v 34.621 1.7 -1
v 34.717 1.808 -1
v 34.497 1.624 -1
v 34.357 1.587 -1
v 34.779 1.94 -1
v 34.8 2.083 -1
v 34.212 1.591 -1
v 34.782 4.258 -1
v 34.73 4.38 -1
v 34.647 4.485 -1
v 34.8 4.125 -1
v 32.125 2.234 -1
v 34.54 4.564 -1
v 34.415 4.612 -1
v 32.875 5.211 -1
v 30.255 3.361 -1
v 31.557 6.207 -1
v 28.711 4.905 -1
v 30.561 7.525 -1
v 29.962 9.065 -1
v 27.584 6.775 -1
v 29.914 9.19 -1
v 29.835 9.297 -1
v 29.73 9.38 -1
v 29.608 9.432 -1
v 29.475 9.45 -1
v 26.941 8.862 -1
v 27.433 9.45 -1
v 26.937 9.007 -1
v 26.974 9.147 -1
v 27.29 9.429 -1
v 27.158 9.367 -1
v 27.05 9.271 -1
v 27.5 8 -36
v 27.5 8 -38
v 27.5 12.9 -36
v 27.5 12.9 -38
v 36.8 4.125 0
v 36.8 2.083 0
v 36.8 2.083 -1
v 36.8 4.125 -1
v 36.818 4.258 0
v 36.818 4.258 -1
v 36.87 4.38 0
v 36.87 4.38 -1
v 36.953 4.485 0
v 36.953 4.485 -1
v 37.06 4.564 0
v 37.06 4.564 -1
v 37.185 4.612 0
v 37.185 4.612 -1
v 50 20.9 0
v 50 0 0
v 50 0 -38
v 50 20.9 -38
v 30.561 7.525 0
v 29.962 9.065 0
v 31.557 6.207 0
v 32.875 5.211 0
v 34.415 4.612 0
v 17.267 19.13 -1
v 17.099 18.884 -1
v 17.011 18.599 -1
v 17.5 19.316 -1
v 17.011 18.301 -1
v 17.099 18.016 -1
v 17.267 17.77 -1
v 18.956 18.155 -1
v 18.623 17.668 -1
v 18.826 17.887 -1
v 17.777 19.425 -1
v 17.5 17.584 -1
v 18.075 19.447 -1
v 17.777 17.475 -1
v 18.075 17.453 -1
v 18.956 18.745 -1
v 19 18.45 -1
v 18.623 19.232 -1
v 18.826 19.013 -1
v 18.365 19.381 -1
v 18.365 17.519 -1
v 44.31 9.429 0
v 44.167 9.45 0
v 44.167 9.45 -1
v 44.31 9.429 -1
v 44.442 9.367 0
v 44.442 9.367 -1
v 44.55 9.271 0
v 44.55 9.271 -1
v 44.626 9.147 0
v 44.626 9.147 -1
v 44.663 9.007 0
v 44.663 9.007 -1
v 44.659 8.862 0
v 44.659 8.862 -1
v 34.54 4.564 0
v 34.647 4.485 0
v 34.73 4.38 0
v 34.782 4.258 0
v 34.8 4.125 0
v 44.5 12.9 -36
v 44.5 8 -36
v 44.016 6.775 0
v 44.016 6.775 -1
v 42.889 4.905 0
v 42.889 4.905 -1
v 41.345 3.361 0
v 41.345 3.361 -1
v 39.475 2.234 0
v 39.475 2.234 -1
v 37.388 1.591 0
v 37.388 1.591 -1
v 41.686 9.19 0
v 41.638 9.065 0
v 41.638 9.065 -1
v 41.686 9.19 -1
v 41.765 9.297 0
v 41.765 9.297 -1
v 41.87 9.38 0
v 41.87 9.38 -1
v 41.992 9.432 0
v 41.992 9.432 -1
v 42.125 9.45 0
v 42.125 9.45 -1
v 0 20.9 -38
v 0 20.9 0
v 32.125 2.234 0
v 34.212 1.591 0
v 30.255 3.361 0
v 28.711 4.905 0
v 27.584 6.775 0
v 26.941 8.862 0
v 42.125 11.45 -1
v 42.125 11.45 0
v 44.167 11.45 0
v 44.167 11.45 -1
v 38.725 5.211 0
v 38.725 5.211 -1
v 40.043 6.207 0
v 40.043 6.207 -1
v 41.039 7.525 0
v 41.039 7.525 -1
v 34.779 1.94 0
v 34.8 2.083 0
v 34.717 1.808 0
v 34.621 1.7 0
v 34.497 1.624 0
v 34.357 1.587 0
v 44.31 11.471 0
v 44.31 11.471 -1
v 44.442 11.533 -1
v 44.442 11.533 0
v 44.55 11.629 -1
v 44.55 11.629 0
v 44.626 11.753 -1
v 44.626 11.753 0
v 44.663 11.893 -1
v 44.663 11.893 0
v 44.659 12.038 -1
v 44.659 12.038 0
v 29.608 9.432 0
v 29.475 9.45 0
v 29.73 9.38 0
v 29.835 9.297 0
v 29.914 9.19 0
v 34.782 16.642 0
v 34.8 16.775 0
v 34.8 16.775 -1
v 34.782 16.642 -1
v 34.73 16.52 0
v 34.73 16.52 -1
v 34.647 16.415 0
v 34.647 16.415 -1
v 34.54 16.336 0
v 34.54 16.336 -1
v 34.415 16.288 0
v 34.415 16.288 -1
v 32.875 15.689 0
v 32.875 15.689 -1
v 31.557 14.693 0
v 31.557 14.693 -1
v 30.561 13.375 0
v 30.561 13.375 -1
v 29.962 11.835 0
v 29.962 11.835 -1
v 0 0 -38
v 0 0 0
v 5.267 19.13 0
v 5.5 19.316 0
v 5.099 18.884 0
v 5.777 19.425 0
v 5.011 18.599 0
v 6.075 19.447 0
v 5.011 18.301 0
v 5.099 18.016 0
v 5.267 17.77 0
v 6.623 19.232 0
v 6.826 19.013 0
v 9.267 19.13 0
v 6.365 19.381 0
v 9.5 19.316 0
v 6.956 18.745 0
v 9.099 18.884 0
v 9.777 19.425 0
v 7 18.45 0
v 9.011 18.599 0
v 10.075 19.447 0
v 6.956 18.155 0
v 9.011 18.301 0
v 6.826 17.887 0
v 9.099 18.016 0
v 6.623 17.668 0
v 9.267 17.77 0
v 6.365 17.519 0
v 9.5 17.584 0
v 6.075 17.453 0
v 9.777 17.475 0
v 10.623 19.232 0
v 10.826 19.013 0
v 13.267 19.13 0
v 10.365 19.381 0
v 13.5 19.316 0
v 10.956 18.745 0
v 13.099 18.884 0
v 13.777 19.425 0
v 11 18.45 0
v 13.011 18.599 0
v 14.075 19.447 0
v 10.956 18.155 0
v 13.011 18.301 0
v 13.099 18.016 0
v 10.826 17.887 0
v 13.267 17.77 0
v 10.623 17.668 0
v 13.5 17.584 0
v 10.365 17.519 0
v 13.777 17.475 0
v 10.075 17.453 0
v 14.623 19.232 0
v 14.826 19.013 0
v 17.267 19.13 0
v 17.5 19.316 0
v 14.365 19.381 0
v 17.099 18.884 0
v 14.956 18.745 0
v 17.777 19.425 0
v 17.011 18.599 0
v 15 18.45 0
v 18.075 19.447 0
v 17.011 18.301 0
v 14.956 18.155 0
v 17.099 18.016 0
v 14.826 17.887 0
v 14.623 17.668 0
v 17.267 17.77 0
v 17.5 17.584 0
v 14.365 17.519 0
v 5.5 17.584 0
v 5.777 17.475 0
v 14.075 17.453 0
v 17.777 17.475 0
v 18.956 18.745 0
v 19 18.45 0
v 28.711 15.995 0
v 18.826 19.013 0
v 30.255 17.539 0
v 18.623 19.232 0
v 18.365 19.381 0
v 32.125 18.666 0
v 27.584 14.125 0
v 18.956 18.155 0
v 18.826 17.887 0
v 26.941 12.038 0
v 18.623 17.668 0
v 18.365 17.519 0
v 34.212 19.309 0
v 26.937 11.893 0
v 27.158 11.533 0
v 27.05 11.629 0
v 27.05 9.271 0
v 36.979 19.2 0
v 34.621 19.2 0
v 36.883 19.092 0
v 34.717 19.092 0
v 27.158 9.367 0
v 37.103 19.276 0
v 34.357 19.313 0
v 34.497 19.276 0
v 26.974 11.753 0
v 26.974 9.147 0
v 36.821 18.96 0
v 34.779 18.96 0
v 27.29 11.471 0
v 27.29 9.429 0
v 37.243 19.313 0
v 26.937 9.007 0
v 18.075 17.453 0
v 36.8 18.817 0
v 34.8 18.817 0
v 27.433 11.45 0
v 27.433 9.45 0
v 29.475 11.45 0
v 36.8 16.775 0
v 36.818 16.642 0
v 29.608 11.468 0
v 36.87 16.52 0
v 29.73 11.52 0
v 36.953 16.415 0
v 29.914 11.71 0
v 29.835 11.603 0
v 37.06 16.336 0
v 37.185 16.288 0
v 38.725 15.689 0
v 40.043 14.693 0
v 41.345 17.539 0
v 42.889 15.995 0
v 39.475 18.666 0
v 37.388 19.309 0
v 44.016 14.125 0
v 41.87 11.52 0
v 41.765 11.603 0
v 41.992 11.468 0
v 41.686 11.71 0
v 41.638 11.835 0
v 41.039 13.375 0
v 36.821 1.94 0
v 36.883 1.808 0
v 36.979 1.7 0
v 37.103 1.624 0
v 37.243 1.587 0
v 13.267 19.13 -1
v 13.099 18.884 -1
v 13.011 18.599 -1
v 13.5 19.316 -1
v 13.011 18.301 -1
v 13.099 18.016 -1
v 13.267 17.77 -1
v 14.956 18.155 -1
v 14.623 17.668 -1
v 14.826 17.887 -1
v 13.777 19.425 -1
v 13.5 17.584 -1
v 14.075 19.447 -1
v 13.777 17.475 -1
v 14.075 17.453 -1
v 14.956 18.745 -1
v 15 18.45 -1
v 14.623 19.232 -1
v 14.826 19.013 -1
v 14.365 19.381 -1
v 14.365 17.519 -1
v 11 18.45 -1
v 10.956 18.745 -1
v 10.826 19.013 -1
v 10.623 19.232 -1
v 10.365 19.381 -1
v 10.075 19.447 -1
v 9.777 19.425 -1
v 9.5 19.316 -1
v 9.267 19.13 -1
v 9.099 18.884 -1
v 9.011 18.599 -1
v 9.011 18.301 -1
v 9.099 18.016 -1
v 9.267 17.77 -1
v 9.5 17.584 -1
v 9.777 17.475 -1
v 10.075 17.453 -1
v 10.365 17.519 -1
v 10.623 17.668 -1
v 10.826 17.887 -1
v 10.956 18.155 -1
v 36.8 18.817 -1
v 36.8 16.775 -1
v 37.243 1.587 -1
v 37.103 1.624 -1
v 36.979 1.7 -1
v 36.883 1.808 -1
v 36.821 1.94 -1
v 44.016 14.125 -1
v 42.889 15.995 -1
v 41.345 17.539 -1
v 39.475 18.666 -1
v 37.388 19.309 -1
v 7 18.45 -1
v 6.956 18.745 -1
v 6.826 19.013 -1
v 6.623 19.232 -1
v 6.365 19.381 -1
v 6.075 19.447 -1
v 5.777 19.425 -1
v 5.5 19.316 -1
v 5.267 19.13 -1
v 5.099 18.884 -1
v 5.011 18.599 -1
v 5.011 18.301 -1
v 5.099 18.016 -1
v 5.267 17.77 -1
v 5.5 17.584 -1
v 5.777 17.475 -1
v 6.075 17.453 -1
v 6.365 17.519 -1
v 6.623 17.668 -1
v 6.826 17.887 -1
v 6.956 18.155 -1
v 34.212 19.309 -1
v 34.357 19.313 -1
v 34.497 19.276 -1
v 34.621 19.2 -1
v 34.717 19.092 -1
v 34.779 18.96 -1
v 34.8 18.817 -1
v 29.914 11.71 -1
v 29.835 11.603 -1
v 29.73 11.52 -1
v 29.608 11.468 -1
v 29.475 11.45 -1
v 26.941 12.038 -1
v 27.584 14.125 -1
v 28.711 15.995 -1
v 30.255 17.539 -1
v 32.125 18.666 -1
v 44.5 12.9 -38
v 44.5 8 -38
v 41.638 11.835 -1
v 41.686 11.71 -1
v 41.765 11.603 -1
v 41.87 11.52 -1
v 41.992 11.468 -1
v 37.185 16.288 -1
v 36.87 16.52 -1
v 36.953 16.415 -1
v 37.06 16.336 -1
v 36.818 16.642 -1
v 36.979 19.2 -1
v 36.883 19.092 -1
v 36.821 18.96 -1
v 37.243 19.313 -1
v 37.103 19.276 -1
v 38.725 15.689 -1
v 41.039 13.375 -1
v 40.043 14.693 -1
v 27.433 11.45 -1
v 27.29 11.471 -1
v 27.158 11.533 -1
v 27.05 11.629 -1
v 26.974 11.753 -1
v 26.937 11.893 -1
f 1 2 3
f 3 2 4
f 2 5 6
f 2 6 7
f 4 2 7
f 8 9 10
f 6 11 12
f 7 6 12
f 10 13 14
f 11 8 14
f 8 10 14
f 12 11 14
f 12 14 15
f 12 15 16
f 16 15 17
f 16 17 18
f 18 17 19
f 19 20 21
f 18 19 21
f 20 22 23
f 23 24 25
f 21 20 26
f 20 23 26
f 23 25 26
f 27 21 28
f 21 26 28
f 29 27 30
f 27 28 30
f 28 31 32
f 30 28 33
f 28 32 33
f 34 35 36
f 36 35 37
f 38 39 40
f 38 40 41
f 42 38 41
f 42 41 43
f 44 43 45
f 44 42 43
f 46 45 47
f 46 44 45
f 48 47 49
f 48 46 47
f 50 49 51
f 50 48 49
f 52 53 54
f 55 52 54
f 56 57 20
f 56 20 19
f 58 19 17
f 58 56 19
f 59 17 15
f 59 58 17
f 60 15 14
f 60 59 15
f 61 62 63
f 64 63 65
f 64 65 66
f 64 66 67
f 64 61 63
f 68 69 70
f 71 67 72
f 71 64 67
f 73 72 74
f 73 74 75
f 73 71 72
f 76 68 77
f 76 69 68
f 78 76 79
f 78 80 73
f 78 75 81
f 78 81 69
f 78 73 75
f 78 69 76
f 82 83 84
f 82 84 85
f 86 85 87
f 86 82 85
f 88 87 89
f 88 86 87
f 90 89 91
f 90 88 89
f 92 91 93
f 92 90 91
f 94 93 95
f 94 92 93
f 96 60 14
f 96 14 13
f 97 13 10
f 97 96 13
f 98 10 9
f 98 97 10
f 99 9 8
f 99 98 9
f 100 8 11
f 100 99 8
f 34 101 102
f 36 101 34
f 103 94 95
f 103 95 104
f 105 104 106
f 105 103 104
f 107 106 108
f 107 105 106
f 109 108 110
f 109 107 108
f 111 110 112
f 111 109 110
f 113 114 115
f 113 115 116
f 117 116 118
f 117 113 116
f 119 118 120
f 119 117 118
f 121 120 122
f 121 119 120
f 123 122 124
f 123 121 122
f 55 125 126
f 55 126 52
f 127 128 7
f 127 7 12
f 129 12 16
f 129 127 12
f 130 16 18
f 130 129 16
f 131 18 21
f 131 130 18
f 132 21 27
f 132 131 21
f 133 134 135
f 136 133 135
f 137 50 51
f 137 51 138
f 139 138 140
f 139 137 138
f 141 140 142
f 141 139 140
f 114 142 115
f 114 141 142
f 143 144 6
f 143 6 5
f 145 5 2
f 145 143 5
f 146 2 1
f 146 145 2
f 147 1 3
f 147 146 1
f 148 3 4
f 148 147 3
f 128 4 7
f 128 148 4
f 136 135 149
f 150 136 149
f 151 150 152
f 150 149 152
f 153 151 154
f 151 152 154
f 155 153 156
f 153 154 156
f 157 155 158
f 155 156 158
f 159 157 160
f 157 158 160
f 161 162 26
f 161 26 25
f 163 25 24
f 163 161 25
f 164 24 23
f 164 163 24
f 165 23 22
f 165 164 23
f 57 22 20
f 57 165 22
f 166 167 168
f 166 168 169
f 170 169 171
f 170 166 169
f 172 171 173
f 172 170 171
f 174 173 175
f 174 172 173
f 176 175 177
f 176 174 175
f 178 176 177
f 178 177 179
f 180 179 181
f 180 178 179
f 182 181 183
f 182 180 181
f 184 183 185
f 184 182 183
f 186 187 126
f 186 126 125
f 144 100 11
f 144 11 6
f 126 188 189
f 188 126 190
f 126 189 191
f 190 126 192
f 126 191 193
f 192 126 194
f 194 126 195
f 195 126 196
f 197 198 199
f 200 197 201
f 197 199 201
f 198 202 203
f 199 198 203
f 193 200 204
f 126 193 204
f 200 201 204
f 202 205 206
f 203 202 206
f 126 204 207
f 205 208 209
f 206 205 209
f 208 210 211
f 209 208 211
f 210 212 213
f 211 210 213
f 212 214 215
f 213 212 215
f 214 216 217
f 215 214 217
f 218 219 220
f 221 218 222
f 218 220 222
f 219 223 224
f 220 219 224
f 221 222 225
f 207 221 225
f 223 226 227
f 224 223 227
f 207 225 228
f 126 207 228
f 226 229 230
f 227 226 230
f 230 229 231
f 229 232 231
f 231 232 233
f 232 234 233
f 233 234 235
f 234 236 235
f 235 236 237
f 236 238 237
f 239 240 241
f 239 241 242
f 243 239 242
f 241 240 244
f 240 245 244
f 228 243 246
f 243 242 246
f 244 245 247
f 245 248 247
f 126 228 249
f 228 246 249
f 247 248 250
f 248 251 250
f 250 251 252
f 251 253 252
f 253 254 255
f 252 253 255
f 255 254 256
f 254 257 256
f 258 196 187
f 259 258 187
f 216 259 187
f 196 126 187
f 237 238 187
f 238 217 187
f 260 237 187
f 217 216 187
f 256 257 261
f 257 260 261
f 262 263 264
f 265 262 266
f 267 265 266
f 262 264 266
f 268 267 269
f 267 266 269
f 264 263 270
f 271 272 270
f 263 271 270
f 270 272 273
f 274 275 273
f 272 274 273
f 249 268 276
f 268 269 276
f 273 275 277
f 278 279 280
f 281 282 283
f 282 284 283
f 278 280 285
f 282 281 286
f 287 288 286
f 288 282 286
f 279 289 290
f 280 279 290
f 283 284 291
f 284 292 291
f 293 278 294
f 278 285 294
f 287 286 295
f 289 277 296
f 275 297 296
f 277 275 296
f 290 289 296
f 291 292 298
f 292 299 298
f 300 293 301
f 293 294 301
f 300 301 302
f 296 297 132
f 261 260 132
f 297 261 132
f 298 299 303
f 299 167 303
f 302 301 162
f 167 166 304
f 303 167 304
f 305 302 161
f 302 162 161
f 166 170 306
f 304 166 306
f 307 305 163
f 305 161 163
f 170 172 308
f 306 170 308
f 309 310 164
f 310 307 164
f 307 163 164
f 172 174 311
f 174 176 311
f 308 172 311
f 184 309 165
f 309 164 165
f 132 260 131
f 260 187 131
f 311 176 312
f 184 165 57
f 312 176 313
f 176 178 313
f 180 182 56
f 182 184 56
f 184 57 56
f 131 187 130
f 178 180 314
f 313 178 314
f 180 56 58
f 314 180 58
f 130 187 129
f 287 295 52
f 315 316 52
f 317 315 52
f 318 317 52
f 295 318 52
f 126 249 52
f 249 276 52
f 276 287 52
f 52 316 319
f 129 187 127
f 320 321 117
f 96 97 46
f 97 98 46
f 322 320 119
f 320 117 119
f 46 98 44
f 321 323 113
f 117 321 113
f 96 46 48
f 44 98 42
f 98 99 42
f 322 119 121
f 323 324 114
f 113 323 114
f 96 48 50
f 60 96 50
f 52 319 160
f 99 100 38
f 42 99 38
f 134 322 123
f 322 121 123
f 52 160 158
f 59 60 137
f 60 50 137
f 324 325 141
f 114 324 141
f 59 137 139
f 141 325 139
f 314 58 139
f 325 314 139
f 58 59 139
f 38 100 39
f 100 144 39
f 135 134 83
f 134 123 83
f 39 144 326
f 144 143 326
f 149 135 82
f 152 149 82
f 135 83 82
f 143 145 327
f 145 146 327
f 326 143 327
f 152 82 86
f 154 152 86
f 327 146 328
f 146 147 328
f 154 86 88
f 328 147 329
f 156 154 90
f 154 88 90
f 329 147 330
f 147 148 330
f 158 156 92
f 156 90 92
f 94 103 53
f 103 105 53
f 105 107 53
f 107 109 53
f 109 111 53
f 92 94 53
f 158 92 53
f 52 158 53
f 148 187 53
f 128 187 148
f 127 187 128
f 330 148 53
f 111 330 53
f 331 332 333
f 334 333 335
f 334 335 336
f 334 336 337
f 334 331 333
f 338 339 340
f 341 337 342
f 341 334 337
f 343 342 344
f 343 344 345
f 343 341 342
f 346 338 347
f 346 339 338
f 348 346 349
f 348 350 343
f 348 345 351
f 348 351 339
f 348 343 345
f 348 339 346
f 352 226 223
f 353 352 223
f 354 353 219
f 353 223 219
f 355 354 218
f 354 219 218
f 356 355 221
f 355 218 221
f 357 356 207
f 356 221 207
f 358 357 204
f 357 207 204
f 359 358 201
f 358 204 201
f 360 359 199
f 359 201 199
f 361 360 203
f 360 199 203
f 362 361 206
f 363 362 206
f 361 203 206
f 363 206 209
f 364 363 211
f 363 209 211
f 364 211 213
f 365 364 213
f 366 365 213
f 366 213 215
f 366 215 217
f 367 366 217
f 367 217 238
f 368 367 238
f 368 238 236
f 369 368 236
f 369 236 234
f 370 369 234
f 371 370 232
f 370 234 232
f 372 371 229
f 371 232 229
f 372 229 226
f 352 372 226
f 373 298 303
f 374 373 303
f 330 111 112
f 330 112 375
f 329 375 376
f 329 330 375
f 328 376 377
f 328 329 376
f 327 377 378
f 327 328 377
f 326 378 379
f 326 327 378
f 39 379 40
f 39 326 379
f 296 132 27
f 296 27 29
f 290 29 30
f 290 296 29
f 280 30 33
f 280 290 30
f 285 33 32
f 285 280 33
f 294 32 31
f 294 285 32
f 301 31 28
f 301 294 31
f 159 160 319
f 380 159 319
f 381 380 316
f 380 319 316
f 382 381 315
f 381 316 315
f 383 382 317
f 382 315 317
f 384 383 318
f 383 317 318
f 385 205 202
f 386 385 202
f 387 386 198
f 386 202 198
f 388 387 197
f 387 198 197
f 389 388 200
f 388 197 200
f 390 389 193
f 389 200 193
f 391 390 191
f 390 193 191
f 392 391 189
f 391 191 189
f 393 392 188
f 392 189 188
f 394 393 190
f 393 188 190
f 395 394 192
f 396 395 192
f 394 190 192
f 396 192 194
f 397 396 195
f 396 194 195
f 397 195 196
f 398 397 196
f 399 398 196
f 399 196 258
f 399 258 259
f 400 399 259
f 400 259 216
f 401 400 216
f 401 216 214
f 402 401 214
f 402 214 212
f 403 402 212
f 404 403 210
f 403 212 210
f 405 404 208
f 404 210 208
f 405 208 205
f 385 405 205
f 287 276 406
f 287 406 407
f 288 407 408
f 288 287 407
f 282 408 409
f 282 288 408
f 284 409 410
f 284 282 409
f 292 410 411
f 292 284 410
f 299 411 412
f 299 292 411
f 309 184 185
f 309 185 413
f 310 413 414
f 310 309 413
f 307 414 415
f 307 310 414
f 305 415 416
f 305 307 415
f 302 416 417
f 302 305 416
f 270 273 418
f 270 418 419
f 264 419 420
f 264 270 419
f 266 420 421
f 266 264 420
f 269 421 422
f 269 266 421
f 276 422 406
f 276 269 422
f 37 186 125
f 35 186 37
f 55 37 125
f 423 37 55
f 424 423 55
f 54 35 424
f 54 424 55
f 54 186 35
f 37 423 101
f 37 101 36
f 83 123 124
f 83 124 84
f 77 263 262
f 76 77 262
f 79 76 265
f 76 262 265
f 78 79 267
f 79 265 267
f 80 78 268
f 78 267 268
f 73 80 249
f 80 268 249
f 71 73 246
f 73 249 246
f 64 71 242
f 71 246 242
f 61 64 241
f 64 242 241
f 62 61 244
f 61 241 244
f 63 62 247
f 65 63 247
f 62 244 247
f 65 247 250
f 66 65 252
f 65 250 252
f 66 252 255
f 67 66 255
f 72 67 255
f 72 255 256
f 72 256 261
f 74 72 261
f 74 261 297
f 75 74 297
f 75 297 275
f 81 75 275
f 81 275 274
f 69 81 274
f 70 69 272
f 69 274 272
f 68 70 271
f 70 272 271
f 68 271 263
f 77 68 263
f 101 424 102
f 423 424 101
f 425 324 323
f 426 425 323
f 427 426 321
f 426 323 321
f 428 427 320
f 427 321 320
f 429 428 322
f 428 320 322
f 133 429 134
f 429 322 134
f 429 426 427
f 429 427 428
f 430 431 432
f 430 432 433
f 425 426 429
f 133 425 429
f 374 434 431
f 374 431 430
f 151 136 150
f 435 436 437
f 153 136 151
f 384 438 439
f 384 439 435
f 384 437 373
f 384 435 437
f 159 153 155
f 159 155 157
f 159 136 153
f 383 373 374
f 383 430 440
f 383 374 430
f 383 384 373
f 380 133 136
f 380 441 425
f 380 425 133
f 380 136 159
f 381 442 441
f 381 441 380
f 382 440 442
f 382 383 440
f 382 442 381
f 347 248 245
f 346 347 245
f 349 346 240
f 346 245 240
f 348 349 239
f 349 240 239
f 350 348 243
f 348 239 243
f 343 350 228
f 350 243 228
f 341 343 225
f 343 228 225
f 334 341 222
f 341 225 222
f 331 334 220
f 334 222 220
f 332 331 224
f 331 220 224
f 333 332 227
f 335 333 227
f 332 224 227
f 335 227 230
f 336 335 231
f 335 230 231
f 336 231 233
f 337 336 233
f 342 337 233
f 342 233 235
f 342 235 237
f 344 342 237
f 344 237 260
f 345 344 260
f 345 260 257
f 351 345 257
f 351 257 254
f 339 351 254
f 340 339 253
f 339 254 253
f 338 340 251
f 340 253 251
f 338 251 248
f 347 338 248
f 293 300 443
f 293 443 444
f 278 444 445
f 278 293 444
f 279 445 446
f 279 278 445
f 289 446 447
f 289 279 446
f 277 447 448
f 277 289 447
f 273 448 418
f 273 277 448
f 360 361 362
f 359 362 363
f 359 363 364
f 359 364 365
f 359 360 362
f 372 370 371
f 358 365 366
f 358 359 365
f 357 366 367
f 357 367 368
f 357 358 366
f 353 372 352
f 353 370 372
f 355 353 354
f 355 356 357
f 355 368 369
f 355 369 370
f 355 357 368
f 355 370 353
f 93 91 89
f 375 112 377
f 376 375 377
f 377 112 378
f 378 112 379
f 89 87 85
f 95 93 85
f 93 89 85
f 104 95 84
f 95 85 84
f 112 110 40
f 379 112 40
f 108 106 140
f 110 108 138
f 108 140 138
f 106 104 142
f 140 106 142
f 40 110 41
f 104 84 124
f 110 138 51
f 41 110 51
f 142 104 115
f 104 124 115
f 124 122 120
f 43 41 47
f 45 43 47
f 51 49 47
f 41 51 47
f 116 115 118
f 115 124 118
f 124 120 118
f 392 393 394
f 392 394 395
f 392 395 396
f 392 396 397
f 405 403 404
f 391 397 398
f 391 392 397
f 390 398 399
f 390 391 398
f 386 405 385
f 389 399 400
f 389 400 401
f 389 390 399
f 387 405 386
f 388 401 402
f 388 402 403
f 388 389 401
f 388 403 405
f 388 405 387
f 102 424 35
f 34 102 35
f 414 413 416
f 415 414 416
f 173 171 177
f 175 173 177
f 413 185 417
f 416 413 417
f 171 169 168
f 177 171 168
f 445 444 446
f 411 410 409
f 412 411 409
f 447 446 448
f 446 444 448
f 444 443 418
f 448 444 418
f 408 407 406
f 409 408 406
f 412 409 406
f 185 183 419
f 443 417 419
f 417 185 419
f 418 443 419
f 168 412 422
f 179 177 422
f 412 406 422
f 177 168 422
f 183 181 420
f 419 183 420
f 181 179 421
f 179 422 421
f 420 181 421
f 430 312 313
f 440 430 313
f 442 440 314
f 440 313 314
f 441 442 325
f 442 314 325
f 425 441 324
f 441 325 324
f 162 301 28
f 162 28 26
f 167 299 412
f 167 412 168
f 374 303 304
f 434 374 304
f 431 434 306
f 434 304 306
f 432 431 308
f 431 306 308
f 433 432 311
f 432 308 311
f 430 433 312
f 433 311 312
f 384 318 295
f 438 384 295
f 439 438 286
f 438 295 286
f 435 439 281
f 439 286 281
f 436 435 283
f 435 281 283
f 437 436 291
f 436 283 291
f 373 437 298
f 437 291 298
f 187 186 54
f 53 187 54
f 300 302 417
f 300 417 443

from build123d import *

# Parameters (mm, degrees)
SKETCH1_W           = 50
SKETCH1_H           = 38
BOSS_EXTRUDE1_DEPTH = 20.9
FAN_HOLES_DEPTH     = 1
SKETCH3_W           = 17
SKETCH3_H           = 4.9
CABLE_SLOT_DEPTH    = 2
SKETCH4_R           = 1
HOLES_DEPTH         = 1


with BuildPart() as part:
    # Sketch1 → Boss-Extrude1 (new body)
    with BuildSketch(Plane(origin=(0, 0, 0), x_dir=(1, 0, 0), z_dir=(0, 1, 0))):
        with Locations((25, 19)):
            Rectangle(SKETCH1_W, SKETCH1_H)
    extrude(amount=BOSS_EXTRUDE1_DEPTH)

    # Sketch2 → Fan holes (cut)
    with BuildSketch(Plane.XY):
        with BuildLine():
            Line((42.12455532, 11.45), (44.166600265, 11.45))
            ThreePointArc((44.166600265, 11.45), (44.55008276, 11.629155526), (44.658753222, 12.038235294))
            ThreePointArc((44.658753222, 12.038235294), (42.163961031, 16.813961031), (37.388235294, 19.308753222))
            ThreePointArc((37.388235294, 19.308753222), (36.979155526, 19.20008276), (36.8, 18.816600265))
            Line((36.8, 18.816600265), (36.8, 16.77455532))
            ThreePointArc((36.8, 16.77455532), (36.90776773, 16.464468484), (37.184615385, 16.288051065))
            ThreePointArc((37.184615385, 16.288051065), (40.042640687, 14.692640687), (41.638051065, 11.834615385))
            ThreePointArc((41.638051065, 11.834615385), (41.814468484, 11.55776773), (42.12455532, 11.45))
        make_face()
        with BuildLine():
            Line((34.8, 18.816600265), (34.8, 16.77455532))
            ThreePointArc((34.8, 16.77455532), (34.69223227, 16.464468484), (34.415384615, 16.288051065))
            ThreePointArc((34.415384615, 16.288051065), (31.557359313, 14.692640687), (29.961948935, 11.834615385))
            ThreePointArc((29.961948935, 11.834615385), (29.785531516, 11.55776773), (29.47544468, 11.45))
            Line((29.47544468, 11.45), (27.433399735, 11.45))
            ThreePointArc((27.433399735, 11.45), (27.04991724, 11.629155526), (26.941246778, 12.038235294))
            ThreePointArc((26.941246778, 12.038235294), (29.436038969, 16.813961031), (34.211764706, 19.308753222))
            ThreePointArc((34.211764706, 19.308753222), (34.620844474, 19.20008276), (34.8, 18.816600265))
        make_face()
        with BuildLine():
            Line((27.433399735, 9.45), (29.47544468, 9.45))
            ThreePointArc((29.47544468, 9.45), (29.785531516, 9.34223227), (29.961948935, 9.065384615))
            ThreePointArc((29.961948935, 9.065384615), (31.557359313, 6.207359313), (34.415384615, 4.611948935))
            ThreePointArc((34.415384615, 4.611948935), (34.69223227, 4.435531516), (34.8, 4.12544468))
            Line((34.8, 4.12544468), (34.8, 2.083399735))
            ThreePointArc((34.8, 2.083399735), (34.620844474, 1.69991724), (34.211764706, 1.591246778))
            ThreePointArc((34.211764706, 1.591246778), (29.436038969, 4.086038969), (26.941246778, 8.861764706))
            ThreePointArc((26.941246778, 8.861764706), (27.04991724, 9.270844474), (27.433399735, 9.45))
        make_face()
        with BuildLine():
            Line((42.12455532, 9.45), (44.166600265, 9.45))
            ThreePointArc((44.166600265, 9.45), (44.55008276, 9.270844474), (44.658753222, 8.861764706))
            ThreePointArc((44.658753222, 8.861764706), (42.163961031, 4.086038969), (37.388235294, 1.591246778))
            ThreePointArc((37.388235294, 1.591246778), (36.979155526, 1.69991724), (36.8, 2.083399735))
            Line((36.8, 2.083399735), (36.8, 4.12544468))
            ThreePointArc((36.8, 4.12544468), (36.90776773, 4.435531516), (37.184615385, 4.611948935))
            ThreePointArc((37.184615385, 4.611948935), (40.042640687, 6.207359313), (41.638051065, 9.065384615))
            ThreePointArc((41.638051065, 9.065384615), (41.814468484, 9.34223227), (42.12455532, 9.45))
        make_face()
    extrude(amount=-FAN_HOLES_DEPTH, mode=Mode.SUBTRACT)

    # Sketch3 → Cable slot (cut)
    with BuildSketch(Plane(origin=(0, 0, -38), x_dir=(-1, 0, 0), z_dir=(0, 0, -1))):
        with Locations((-36, 10.45)):
            Rectangle(SKETCH3_W, SKETCH3_H)
    extrude(amount=-CABLE_SLOT_DEPTH, mode=Mode.SUBTRACT)

    # Sketch4 → Holes (cut)
    with BuildSketch(Plane.XY):
        with Locations((6, 18.45)):
            Circle(SKETCH4_R)
        with Locations((10, 18.45)):
            Circle(SKETCH4_R)
        with Locations((14, 18.45)):
            Circle(SKETCH4_R)
        with Locations((18, 18.45)):
            Circle(SKETCH4_R)
    extrude(amount=-HOLES_DEPTH, mode=Mode.SUBTRACT)


solid = part.part
